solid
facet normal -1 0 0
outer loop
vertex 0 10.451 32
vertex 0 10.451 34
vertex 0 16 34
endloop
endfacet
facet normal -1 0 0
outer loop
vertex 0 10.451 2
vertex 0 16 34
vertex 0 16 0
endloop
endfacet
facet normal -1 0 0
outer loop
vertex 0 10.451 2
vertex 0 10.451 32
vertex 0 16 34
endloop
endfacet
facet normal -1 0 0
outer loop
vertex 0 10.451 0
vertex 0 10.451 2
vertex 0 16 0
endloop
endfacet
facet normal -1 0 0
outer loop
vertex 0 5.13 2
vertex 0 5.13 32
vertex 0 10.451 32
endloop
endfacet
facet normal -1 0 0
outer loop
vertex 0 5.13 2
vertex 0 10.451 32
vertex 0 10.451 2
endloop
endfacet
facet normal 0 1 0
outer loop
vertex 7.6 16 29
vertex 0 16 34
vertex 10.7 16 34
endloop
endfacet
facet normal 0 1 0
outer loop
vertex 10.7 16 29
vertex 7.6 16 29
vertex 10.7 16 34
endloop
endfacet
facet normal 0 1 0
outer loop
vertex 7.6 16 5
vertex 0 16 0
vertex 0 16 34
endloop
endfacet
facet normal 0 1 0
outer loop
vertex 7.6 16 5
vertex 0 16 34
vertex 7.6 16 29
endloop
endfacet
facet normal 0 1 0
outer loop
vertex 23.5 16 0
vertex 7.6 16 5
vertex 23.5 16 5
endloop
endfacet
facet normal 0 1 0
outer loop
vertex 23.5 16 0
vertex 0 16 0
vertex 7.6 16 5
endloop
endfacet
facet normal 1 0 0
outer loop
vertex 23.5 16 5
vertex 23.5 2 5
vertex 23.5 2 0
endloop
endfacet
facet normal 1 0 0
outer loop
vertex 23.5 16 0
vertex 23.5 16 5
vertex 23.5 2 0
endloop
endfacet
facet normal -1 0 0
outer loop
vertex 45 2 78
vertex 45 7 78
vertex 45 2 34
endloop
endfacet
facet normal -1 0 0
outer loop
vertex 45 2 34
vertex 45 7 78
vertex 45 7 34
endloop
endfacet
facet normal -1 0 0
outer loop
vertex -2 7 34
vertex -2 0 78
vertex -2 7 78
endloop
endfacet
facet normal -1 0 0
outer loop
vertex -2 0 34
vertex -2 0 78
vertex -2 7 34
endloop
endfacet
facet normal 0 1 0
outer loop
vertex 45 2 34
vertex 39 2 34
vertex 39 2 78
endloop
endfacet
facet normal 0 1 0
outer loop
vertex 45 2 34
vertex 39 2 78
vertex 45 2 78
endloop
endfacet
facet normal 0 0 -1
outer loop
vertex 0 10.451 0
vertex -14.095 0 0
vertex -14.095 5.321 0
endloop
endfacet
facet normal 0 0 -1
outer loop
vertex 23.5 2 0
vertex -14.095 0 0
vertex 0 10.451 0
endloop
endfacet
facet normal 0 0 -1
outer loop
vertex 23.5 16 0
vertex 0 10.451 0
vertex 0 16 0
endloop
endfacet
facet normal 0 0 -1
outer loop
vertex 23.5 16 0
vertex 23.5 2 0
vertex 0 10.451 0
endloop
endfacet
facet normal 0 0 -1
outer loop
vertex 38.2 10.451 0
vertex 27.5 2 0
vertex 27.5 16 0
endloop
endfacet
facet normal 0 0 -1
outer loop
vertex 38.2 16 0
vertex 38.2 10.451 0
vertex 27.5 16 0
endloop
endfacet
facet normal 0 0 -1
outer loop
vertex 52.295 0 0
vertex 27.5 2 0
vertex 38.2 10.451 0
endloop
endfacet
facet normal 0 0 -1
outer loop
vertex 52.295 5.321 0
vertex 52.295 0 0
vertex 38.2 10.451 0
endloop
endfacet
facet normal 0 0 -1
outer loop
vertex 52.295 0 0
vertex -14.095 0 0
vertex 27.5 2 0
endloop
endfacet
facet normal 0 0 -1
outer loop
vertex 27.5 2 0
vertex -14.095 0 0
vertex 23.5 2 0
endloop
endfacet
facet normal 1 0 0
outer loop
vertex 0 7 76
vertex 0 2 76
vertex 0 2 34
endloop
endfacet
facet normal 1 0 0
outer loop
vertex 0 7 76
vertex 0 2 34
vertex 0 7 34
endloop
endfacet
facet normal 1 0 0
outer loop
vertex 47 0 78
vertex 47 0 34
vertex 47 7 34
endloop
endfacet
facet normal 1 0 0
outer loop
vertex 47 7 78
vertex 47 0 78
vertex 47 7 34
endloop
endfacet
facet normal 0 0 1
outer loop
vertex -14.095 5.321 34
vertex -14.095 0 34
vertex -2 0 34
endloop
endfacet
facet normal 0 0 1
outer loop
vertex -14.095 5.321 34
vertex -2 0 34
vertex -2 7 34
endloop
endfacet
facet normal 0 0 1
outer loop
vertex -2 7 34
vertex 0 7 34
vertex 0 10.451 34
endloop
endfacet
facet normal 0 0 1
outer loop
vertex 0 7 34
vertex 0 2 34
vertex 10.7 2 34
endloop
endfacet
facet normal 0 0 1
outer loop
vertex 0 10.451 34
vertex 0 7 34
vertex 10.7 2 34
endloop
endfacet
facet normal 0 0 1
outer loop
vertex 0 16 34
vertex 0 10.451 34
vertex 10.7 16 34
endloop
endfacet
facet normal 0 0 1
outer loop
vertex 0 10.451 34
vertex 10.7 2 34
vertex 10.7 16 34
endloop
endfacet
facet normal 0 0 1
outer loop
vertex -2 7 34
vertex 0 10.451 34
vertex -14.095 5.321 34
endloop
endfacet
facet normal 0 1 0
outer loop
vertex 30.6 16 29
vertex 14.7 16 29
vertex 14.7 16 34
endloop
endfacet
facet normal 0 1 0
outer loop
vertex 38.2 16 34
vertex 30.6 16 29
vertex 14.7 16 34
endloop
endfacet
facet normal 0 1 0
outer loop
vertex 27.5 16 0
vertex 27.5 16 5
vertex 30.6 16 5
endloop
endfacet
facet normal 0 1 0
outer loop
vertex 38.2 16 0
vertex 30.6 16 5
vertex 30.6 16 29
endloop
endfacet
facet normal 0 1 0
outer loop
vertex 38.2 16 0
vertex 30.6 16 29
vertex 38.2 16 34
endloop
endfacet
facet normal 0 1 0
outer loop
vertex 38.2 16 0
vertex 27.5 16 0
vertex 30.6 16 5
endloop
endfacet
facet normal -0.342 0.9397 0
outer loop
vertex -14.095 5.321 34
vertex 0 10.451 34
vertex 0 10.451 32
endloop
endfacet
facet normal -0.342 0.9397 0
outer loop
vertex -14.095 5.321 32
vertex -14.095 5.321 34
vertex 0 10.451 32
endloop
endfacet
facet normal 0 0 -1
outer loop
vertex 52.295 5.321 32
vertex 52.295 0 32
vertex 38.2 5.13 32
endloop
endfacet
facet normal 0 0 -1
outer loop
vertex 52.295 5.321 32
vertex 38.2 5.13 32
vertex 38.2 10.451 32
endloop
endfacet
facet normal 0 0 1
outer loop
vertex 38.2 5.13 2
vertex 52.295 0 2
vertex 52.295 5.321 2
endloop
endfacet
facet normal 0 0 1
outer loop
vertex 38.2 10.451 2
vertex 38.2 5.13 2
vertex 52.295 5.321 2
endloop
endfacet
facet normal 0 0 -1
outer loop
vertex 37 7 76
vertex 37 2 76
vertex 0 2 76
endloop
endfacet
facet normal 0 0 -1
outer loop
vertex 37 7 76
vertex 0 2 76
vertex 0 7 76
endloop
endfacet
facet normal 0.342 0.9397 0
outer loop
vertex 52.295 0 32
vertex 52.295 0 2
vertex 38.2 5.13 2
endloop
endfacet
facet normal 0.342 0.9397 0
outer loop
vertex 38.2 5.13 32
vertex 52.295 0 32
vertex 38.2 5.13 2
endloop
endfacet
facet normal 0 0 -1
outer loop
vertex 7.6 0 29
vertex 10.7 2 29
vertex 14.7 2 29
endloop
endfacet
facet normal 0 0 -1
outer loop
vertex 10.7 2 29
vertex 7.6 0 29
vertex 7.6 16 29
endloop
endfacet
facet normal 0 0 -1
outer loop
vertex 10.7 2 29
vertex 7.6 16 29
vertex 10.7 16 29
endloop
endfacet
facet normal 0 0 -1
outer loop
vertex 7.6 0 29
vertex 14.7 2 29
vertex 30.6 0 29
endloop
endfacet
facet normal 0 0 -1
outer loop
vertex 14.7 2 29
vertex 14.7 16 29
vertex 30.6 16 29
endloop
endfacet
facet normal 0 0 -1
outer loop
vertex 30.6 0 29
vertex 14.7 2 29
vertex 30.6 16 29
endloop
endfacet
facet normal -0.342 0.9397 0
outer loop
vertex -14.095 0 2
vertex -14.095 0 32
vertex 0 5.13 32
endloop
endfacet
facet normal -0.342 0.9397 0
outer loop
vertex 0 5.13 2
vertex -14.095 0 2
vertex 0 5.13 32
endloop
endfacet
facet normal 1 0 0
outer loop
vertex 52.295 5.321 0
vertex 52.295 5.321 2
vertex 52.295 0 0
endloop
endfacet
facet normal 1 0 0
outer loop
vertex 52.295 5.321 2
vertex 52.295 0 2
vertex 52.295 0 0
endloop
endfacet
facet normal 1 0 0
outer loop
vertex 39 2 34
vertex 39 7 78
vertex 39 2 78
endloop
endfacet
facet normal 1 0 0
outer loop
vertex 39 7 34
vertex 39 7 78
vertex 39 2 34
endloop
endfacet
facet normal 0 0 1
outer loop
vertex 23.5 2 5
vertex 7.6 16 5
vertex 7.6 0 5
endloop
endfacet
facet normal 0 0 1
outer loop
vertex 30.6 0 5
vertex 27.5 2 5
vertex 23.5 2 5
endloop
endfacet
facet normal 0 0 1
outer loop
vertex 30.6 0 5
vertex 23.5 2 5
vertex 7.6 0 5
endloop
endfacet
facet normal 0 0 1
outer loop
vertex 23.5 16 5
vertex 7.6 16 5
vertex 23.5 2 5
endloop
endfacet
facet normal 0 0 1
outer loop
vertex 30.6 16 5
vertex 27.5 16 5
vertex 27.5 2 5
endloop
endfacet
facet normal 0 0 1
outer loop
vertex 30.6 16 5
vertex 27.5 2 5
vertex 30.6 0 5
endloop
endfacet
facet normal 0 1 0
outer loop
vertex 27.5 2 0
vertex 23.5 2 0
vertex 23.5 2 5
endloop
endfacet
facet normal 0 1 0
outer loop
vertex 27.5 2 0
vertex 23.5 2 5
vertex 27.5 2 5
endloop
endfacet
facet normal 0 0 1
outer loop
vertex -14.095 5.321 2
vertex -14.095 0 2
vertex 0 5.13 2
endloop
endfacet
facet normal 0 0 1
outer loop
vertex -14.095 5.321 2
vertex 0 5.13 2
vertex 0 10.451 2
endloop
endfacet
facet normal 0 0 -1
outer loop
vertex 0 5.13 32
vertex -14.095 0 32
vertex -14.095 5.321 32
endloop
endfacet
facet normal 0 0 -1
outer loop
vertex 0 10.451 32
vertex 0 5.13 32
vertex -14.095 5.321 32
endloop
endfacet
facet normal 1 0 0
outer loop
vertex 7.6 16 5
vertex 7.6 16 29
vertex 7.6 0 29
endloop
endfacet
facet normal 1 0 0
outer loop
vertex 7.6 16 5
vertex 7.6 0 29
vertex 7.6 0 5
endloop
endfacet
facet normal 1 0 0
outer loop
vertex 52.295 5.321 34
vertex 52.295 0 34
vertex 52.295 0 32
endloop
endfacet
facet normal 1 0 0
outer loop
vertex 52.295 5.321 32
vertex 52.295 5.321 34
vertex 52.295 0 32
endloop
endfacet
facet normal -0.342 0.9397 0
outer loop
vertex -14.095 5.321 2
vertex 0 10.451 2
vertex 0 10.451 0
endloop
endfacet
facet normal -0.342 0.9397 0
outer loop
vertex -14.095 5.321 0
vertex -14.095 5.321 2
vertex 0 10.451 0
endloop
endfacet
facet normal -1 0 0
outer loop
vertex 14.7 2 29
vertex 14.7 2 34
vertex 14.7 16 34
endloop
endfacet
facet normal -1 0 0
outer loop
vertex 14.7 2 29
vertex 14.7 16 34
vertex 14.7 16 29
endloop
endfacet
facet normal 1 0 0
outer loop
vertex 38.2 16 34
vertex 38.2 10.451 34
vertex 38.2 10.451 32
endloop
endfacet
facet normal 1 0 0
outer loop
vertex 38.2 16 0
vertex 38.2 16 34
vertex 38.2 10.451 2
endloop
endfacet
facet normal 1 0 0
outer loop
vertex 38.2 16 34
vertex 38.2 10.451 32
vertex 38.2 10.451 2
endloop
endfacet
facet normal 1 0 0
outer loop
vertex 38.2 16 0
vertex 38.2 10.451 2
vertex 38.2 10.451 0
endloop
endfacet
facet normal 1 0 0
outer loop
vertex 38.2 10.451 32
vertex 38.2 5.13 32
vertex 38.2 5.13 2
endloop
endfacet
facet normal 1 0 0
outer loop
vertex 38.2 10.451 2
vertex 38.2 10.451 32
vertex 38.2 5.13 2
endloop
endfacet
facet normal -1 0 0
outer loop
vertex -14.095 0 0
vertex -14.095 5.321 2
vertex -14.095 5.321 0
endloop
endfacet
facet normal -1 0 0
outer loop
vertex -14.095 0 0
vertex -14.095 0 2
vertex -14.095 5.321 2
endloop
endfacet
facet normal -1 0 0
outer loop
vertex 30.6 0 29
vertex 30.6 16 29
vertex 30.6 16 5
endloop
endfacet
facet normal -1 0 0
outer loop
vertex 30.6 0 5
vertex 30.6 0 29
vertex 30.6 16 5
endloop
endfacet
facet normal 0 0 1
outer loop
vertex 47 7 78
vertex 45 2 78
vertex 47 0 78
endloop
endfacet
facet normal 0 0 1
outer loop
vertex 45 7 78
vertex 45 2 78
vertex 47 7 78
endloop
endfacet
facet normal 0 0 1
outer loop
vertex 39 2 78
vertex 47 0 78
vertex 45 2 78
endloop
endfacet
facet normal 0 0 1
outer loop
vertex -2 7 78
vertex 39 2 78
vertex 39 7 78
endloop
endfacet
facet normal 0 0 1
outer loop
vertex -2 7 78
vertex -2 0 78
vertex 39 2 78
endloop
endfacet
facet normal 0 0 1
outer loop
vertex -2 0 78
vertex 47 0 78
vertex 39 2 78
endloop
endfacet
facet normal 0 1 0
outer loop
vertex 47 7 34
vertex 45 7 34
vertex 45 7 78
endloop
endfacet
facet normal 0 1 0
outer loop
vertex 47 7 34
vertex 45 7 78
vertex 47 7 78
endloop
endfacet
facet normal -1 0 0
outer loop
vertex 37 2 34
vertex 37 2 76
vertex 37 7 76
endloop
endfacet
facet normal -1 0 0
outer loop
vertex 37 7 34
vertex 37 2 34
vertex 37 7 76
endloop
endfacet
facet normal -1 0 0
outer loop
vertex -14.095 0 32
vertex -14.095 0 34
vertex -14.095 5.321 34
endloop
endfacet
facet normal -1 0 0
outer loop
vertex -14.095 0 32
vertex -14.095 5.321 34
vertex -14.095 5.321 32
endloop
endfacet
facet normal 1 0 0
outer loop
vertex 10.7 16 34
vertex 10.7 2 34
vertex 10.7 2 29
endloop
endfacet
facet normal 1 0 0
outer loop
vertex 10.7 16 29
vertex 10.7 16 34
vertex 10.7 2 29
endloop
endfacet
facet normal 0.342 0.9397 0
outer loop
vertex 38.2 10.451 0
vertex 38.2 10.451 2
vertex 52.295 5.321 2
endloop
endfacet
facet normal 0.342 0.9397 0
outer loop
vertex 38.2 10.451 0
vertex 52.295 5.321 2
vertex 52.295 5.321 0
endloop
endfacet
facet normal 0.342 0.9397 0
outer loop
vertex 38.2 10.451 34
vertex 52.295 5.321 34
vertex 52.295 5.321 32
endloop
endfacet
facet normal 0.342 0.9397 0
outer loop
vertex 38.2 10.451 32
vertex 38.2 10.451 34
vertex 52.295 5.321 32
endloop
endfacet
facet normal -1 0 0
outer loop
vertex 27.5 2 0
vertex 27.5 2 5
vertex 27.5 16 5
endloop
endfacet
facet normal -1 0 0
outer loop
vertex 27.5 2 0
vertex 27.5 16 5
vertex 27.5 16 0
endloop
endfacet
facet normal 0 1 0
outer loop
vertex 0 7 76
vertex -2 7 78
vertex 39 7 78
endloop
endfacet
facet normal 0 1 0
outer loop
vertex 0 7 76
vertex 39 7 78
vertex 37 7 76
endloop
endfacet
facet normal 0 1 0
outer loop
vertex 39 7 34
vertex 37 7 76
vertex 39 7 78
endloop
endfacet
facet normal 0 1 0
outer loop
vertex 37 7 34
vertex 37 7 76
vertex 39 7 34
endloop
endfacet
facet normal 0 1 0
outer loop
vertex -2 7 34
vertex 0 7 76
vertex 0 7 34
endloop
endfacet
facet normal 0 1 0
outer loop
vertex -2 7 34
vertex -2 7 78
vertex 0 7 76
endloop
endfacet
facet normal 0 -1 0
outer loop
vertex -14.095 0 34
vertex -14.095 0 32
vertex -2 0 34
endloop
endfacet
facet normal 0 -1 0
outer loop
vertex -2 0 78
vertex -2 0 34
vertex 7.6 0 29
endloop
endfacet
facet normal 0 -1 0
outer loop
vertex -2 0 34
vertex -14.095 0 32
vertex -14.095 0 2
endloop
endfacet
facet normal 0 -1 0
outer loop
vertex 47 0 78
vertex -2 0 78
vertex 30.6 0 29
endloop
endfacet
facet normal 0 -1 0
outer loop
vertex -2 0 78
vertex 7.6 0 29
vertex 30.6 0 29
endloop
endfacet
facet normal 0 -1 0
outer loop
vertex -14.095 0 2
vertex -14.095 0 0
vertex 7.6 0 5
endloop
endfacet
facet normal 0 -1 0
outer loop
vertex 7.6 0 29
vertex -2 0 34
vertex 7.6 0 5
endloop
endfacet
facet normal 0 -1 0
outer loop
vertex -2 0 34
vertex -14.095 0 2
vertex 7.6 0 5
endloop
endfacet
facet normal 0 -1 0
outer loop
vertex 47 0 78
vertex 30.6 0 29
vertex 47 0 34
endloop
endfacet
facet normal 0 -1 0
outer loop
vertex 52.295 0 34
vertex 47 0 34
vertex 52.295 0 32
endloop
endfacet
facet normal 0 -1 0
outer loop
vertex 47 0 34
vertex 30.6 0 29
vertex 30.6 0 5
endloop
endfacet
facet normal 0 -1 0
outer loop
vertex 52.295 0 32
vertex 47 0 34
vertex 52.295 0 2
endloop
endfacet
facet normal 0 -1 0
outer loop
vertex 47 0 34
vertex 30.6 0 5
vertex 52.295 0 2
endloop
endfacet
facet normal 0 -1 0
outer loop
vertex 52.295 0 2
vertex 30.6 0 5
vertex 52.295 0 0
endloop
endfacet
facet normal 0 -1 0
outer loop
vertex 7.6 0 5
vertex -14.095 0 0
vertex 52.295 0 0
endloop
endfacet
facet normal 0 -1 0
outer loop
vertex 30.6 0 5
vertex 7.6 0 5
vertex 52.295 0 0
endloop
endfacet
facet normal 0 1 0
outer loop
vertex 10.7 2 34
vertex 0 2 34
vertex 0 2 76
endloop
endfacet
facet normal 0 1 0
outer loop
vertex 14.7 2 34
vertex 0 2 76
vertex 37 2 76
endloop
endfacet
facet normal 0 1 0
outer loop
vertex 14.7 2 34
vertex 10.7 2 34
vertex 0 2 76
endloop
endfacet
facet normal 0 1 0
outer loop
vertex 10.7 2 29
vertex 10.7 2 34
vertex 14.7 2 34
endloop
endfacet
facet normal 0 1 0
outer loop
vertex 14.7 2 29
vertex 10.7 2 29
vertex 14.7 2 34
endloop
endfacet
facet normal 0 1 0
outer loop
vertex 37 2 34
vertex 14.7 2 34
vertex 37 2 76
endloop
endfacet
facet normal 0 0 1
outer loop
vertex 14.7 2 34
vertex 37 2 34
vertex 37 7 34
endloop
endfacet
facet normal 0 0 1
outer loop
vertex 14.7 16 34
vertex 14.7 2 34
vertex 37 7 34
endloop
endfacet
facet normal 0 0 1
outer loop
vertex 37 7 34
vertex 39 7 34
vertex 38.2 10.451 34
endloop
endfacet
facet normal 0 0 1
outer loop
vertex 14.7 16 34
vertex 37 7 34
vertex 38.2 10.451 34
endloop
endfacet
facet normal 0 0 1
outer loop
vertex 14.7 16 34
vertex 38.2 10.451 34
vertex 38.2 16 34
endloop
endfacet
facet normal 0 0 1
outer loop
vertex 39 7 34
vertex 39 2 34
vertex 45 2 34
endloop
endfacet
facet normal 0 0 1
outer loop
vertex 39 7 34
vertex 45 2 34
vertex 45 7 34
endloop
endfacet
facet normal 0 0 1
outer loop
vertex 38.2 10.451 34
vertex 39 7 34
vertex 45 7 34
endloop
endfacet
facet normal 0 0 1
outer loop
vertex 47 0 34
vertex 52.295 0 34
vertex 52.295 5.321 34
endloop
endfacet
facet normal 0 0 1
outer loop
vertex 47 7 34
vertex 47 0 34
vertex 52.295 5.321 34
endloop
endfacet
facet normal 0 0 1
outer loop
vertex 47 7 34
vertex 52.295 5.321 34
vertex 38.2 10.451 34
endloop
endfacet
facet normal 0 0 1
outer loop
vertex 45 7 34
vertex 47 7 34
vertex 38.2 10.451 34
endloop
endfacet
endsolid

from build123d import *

# Parameters (mm, degrees)
BOSS_EXTRUDE1_DEPTH            = 34
BOSS_EXTRUDE1_2_DEPTH          = 34
SKETCH5_W                      = 38.2
SKETCH5_H                      = 34
BOSS_EXTRUDE2_DEPTH            = 16
BOSS_EXTRUDE7_REACH            = 77.954
SKETCH12_W                     = 2
SKETCH12_H                     = 5
BOSS_EXTRUDE8_REACH            = 79.938
SKETCH13_W                     = 2
SKETCH13_H                     = 5
CUT_EXTRUDE1_START             = 2
SKETCH6_W                      = 4
SKETCH6_H                      = 5
CUT_EXTRUDE1_DEPTH             = 14
SKETCH7_W                      = 49
SKETCH7_H                      = 44
BOSS_EXTRUDE3_DEPTH            = 2
SKETCH8_W                      = 10
SKETCH8_H                      = 5
SKETCH8_W_2                    = 2
BOSS_EXTRUDE5_DEPTH            = 45
CUT_EXTRUDE2_REACH             = 97.297
SKETCH9_W                      = 6
SKETCH9_H                      = 44
CUT_EXTRUDE2_DIRECTION_2_REACH = 97.297
SKETCH10_W                     = 23
SKETCH10_H                     = 24
CUT_EXTRUDE3_DEPTH             = 16
SKETCH11_W                     = 2
SKETCH11_H                     = 5
BOSS_EXTRUDE6_DEPTH            = 37
SKETCH14_W                     = 5
SKETCH14_H                     = 34
CUT_EXTRUDE4_DEPTH             = 5.320889


with BuildPart() as part:
    # Sketch4 → Boss-Extrude1 (new body)
    with BuildSketch(Plane.XY):
        Polygon((0, 0), (-14.095389312, 0), (0, 5.13030215), align=None)
    extrude(amount=BOSS_EXTRUDE1_DEPTH)



with BuildPart() as body_2:
    # Sketch4 → Boss-Extrude1 2 (new body)
    with BuildSketch(Plane.XY):
        Polygon((52.295389312, 0), (38.2, 5.13030215), (38.2, 0), align=None)
    extrude(amount=BOSS_EXTRUDE1_2_DEPTH)


with BuildPart() as part_1:
    add(part.part)

    add(body_2.part)  # Boss-Extrude2 merges body 2
    # Sketch5 → Boss-Extrude2 (add)
    with BuildSketch(Plane(origin=(0, 0, 0), x_dir=(1, 0, 0), z_dir=(0, 1, 0))):
        with Locations((19.1, -17)):
            Rectangle(SKETCH5_W, SKETCH5_H)
    extrude(amount=BOSS_EXTRUDE2_DEPTH)

    # Boss-Extrude7: up to this plane
    boss_extrude7_end = Plane(origin=(0, 16, 0), z_dir=(1, 0, 0))
    # Sketch12 → Boss-Extrude7 (add, up to the surface)
    with BuildSketch(Plane(origin=(-12.446541984, -4.530170802, 0), x_dir=(0, 0, -1), z_dir=(0.9396926207859105, 0.3420201433256627, 0)), mode=Mode.PRIVATE) as boss_extrude7_sk1:
        with Locations((-1, 7.320907073)):
            Rectangle(SKETCH12_W, SKETCH12_H)
    boss_extrude7_tool1 = split(extrude(boss_extrude7_sk1.sketch, amount=BOSS_EXTRUDE7_REACH, mode=Mode.PRIVATE), bisect_by=boss_extrude7_end, keep=Keep.BOTH, mode=Mode.PRIVATE)
    add(boss_extrude7_tool1.solids().sort_by_distance((-14.95044, 2.349232, 1))[0])
    # Sketch12 → Boss-Extrude7 (add, up to the surface)
    with BuildSketch(Plane(origin=(-12.446541984, -4.530170802, 0), x_dir=(0, 0, -1), z_dir=(0.9396926207859105, 0.3420201433256627, 0)), mode=Mode.PRIVATE) as boss_extrude7_sk2:
        with Locations((-33, 7.320907073)):
            Rectangle(SKETCH12_W, SKETCH12_H)
    boss_extrude7_tool2 = split(extrude(boss_extrude7_sk2.sketch, amount=BOSS_EXTRUDE7_REACH, mode=Mode.PRIVATE), bisect_by=boss_extrude7_end, keep=Keep.BOTH, mode=Mode.PRIVATE)
    add(boss_extrude7_tool2.solids().sort_by_distance((-14.95044, 2.349232, 33))[0])

    # Boss-Extrude8: up to this plane
    boss_extrude8_end = Plane(origin=(38.2, 16, 0), z_dir=(-1, 0, 0))
    # Sketch13 → Boss-Extrude8 (add, up to the surface)
    with BuildSketch(Plane(origin=(46.177990847, -16.807414147, 0), x_dir=(0, 0, -1), z_dir=(0.9396926207859105, -0.3420201433256628, 0)), mode=Mode.PRIVATE) as boss_extrude8_sk1:
        with Locations((-33, 20.386076548)):
            Rectangle(SKETCH13_W, SKETCH13_H)
    boss_extrude8_tool1 = split(extrude(boss_extrude8_sk1.sketch, amount=-BOSS_EXTRUDE8_REACH, mode=Mode.PRIVATE), bisect_by=boss_extrude8_end, keep=Keep.BOTH, mode=Mode.PRIVATE)
    add(boss_extrude8_tool1.solids().sort_by_distance((53.15044, 2.349232, 33))[0])
    # Sketch13 → Boss-Extrude8 (add, up to the surface)
    with BuildSketch(Plane(origin=(46.177990847, -16.807414147, 0), x_dir=(0, 0, -1), z_dir=(0.9396926207859105, -0.3420201433256628, 0)), mode=Mode.PRIVATE) as boss_extrude8_sk2:
        with Locations((-1, 20.386076548)):
            Rectangle(SKETCH13_W, SKETCH13_H)
    boss_extrude8_tool2 = split(extrude(boss_extrude8_sk2.sketch, amount=-BOSS_EXTRUDE8_REACH, mode=Mode.PRIVATE), bisect_by=boss_extrude8_end, keep=Keep.BOTH, mode=Mode.PRIVATE)
    add(boss_extrude8_tool2.solids().sort_by_distance((53.15044, 2.349232, 1))[0])

    # Sketch6 → Cut-Extrude1 (cut)
    with BuildSketch(Plane(origin=(0, 0, 0), x_dir=(1, 0, 0), z_dir=(0, 1, 0)).offset(CUT_EXTRUDE1_START)):
        with Locations((12.7, -31.5)):
            Rectangle(SKETCH6_W, SKETCH6_H)
        with Locations((25.5, -2.5)):
            Rectangle(SKETCH6_W, SKETCH6_H)
    extrude(amount=CUT_EXTRUDE1_DEPTH, mode=Mode.SUBTRACT)

    # Sketch7 → Boss-Extrude3 (add)
    with BuildSketch(Plane(origin=(0, 0, 0), x_dir=(1, 0, 0), z_dir=(0, 1, 0))):
        with Locations((22.5, -56)):
            Rectangle(SKETCH7_W, SKETCH7_H)
    extrude(amount=BOSS_EXTRUDE3_DEPTH)

    # Sketch8 → Boss-Extrude5 (add)
    with BuildSketch(Plane.XY.offset(78)):
        with Locations((42, 4.5)):
            Rectangle(SKETCH8_W, SKETCH8_H)
        with Locations((-1, 4.5)):
            Rectangle(SKETCH8_W_2, SKETCH8_H)
    extrude(amount=-BOSS_EXTRUDE5_DEPTH)

    # Cut-Extrude2: up to this face of the body (flat: up to its plane)
    cut_extrude2_end = Plane(part_1.part.faces().sort_by_distance((18.42961165, 2, 55.702669903))[0])
    # Sketch9 → Cut-Extrude2 (cut, up to the picked face)
    with BuildSketch(Plane(origin=(0, 7, 0), x_dir=(1, 0, 0), z_dir=(0, 1, 0)), mode=Mode.PRIVATE) as cut_extrude2_sk1:
        with Locations((42, -56)):
            Rectangle(SKETCH9_W, SKETCH9_H)
    cut_extrude2_tool1 = split(extrude(cut_extrude2_sk1.sketch, amount=-CUT_EXTRUDE2_REACH, mode=Mode.PRIVATE), bisect_by=cut_extrude2_end, keep=Keep.BOTH, mode=Mode.PRIVATE)
    add(cut_extrude2_tool1.solids().sort_by(Axis((42, 7, 56), (0, -1, 0)))[0], mode=Mode.SUBTRACT)

    # Cut-Extrude2 direction 2: up to this face of the body (flat: up to its plane)
    cut_extrude2_direction_2_end = Plane(part_1.part.faces().sort_by_distance((46.102745014, 7.574827058, 33))[0])
    # Sketch9 → Cut-Extrude2 direction 2 (cut, up to the picked face)
    with BuildSketch(Plane(origin=(0, 7, 0), x_dir=(1, 0, 0), z_dir=(0, 1, 0)), mode=Mode.PRIVATE) as cut_extrude2_direction_2_sk1:
        with Locations((42, -56)):
            Rectangle(SKETCH9_W, SKETCH9_H)
    cut_extrude2_direction_2_tool1 = split(extrude(cut_extrude2_direction_2_sk1.sketch, amount=CUT_EXTRUDE2_DIRECTION_2_REACH, mode=Mode.PRIVATE), bisect_by=cut_extrude2_direction_2_end, keep=Keep.BOTH, mode=Mode.PRIVATE)
    add(cut_extrude2_direction_2_tool1.solids().sort_by(Axis((42, 7, 56), (0, 1, 0)))[0], mode=Mode.SUBTRACT)

    # Sketch10 → Cut-Extrude3 (cut)
    with BuildSketch(Plane(origin=(0, 16, 0), x_dir=(1, 0, 0), z_dir=(0, 1, 0))):
        with Locations((19.1, -17)):
            Rectangle(SKETCH10_W, SKETCH10_H)
    extrude(amount=-CUT_EXTRUDE3_DEPTH, mode=Mode.SUBTRACT)

    # Sketch11 → Boss-Extrude6 (add)
    with BuildSketch(Plane(origin=(0, 0, 0), x_dir=(0, 0, -1), z_dir=(1, 0, 0))):
        with Locations((-77, 4.5)):
            Rectangle(SKETCH11_W, SKETCH11_H)
    extrude(amount=BOSS_EXTRUDE6_DEPTH)

    # Sketch14 → Cut-Extrude4 (cut)
    with BuildSketch(Plane(origin=(0, 0, 0), x_dir=(1, 0, 0), z_dir=(0, 1, 0))):
        with Locations((-16.595389312, -17)):
            Rectangle(SKETCH14_W, SKETCH14_H)
        with Locations((54.795389312, -17)):
            Rectangle(SKETCH14_W, SKETCH14_H)
    extrude(amount=CUT_EXTRUDE4_DEPTH, mode=Mode.SUBTRACT)


solid = part_1.part
